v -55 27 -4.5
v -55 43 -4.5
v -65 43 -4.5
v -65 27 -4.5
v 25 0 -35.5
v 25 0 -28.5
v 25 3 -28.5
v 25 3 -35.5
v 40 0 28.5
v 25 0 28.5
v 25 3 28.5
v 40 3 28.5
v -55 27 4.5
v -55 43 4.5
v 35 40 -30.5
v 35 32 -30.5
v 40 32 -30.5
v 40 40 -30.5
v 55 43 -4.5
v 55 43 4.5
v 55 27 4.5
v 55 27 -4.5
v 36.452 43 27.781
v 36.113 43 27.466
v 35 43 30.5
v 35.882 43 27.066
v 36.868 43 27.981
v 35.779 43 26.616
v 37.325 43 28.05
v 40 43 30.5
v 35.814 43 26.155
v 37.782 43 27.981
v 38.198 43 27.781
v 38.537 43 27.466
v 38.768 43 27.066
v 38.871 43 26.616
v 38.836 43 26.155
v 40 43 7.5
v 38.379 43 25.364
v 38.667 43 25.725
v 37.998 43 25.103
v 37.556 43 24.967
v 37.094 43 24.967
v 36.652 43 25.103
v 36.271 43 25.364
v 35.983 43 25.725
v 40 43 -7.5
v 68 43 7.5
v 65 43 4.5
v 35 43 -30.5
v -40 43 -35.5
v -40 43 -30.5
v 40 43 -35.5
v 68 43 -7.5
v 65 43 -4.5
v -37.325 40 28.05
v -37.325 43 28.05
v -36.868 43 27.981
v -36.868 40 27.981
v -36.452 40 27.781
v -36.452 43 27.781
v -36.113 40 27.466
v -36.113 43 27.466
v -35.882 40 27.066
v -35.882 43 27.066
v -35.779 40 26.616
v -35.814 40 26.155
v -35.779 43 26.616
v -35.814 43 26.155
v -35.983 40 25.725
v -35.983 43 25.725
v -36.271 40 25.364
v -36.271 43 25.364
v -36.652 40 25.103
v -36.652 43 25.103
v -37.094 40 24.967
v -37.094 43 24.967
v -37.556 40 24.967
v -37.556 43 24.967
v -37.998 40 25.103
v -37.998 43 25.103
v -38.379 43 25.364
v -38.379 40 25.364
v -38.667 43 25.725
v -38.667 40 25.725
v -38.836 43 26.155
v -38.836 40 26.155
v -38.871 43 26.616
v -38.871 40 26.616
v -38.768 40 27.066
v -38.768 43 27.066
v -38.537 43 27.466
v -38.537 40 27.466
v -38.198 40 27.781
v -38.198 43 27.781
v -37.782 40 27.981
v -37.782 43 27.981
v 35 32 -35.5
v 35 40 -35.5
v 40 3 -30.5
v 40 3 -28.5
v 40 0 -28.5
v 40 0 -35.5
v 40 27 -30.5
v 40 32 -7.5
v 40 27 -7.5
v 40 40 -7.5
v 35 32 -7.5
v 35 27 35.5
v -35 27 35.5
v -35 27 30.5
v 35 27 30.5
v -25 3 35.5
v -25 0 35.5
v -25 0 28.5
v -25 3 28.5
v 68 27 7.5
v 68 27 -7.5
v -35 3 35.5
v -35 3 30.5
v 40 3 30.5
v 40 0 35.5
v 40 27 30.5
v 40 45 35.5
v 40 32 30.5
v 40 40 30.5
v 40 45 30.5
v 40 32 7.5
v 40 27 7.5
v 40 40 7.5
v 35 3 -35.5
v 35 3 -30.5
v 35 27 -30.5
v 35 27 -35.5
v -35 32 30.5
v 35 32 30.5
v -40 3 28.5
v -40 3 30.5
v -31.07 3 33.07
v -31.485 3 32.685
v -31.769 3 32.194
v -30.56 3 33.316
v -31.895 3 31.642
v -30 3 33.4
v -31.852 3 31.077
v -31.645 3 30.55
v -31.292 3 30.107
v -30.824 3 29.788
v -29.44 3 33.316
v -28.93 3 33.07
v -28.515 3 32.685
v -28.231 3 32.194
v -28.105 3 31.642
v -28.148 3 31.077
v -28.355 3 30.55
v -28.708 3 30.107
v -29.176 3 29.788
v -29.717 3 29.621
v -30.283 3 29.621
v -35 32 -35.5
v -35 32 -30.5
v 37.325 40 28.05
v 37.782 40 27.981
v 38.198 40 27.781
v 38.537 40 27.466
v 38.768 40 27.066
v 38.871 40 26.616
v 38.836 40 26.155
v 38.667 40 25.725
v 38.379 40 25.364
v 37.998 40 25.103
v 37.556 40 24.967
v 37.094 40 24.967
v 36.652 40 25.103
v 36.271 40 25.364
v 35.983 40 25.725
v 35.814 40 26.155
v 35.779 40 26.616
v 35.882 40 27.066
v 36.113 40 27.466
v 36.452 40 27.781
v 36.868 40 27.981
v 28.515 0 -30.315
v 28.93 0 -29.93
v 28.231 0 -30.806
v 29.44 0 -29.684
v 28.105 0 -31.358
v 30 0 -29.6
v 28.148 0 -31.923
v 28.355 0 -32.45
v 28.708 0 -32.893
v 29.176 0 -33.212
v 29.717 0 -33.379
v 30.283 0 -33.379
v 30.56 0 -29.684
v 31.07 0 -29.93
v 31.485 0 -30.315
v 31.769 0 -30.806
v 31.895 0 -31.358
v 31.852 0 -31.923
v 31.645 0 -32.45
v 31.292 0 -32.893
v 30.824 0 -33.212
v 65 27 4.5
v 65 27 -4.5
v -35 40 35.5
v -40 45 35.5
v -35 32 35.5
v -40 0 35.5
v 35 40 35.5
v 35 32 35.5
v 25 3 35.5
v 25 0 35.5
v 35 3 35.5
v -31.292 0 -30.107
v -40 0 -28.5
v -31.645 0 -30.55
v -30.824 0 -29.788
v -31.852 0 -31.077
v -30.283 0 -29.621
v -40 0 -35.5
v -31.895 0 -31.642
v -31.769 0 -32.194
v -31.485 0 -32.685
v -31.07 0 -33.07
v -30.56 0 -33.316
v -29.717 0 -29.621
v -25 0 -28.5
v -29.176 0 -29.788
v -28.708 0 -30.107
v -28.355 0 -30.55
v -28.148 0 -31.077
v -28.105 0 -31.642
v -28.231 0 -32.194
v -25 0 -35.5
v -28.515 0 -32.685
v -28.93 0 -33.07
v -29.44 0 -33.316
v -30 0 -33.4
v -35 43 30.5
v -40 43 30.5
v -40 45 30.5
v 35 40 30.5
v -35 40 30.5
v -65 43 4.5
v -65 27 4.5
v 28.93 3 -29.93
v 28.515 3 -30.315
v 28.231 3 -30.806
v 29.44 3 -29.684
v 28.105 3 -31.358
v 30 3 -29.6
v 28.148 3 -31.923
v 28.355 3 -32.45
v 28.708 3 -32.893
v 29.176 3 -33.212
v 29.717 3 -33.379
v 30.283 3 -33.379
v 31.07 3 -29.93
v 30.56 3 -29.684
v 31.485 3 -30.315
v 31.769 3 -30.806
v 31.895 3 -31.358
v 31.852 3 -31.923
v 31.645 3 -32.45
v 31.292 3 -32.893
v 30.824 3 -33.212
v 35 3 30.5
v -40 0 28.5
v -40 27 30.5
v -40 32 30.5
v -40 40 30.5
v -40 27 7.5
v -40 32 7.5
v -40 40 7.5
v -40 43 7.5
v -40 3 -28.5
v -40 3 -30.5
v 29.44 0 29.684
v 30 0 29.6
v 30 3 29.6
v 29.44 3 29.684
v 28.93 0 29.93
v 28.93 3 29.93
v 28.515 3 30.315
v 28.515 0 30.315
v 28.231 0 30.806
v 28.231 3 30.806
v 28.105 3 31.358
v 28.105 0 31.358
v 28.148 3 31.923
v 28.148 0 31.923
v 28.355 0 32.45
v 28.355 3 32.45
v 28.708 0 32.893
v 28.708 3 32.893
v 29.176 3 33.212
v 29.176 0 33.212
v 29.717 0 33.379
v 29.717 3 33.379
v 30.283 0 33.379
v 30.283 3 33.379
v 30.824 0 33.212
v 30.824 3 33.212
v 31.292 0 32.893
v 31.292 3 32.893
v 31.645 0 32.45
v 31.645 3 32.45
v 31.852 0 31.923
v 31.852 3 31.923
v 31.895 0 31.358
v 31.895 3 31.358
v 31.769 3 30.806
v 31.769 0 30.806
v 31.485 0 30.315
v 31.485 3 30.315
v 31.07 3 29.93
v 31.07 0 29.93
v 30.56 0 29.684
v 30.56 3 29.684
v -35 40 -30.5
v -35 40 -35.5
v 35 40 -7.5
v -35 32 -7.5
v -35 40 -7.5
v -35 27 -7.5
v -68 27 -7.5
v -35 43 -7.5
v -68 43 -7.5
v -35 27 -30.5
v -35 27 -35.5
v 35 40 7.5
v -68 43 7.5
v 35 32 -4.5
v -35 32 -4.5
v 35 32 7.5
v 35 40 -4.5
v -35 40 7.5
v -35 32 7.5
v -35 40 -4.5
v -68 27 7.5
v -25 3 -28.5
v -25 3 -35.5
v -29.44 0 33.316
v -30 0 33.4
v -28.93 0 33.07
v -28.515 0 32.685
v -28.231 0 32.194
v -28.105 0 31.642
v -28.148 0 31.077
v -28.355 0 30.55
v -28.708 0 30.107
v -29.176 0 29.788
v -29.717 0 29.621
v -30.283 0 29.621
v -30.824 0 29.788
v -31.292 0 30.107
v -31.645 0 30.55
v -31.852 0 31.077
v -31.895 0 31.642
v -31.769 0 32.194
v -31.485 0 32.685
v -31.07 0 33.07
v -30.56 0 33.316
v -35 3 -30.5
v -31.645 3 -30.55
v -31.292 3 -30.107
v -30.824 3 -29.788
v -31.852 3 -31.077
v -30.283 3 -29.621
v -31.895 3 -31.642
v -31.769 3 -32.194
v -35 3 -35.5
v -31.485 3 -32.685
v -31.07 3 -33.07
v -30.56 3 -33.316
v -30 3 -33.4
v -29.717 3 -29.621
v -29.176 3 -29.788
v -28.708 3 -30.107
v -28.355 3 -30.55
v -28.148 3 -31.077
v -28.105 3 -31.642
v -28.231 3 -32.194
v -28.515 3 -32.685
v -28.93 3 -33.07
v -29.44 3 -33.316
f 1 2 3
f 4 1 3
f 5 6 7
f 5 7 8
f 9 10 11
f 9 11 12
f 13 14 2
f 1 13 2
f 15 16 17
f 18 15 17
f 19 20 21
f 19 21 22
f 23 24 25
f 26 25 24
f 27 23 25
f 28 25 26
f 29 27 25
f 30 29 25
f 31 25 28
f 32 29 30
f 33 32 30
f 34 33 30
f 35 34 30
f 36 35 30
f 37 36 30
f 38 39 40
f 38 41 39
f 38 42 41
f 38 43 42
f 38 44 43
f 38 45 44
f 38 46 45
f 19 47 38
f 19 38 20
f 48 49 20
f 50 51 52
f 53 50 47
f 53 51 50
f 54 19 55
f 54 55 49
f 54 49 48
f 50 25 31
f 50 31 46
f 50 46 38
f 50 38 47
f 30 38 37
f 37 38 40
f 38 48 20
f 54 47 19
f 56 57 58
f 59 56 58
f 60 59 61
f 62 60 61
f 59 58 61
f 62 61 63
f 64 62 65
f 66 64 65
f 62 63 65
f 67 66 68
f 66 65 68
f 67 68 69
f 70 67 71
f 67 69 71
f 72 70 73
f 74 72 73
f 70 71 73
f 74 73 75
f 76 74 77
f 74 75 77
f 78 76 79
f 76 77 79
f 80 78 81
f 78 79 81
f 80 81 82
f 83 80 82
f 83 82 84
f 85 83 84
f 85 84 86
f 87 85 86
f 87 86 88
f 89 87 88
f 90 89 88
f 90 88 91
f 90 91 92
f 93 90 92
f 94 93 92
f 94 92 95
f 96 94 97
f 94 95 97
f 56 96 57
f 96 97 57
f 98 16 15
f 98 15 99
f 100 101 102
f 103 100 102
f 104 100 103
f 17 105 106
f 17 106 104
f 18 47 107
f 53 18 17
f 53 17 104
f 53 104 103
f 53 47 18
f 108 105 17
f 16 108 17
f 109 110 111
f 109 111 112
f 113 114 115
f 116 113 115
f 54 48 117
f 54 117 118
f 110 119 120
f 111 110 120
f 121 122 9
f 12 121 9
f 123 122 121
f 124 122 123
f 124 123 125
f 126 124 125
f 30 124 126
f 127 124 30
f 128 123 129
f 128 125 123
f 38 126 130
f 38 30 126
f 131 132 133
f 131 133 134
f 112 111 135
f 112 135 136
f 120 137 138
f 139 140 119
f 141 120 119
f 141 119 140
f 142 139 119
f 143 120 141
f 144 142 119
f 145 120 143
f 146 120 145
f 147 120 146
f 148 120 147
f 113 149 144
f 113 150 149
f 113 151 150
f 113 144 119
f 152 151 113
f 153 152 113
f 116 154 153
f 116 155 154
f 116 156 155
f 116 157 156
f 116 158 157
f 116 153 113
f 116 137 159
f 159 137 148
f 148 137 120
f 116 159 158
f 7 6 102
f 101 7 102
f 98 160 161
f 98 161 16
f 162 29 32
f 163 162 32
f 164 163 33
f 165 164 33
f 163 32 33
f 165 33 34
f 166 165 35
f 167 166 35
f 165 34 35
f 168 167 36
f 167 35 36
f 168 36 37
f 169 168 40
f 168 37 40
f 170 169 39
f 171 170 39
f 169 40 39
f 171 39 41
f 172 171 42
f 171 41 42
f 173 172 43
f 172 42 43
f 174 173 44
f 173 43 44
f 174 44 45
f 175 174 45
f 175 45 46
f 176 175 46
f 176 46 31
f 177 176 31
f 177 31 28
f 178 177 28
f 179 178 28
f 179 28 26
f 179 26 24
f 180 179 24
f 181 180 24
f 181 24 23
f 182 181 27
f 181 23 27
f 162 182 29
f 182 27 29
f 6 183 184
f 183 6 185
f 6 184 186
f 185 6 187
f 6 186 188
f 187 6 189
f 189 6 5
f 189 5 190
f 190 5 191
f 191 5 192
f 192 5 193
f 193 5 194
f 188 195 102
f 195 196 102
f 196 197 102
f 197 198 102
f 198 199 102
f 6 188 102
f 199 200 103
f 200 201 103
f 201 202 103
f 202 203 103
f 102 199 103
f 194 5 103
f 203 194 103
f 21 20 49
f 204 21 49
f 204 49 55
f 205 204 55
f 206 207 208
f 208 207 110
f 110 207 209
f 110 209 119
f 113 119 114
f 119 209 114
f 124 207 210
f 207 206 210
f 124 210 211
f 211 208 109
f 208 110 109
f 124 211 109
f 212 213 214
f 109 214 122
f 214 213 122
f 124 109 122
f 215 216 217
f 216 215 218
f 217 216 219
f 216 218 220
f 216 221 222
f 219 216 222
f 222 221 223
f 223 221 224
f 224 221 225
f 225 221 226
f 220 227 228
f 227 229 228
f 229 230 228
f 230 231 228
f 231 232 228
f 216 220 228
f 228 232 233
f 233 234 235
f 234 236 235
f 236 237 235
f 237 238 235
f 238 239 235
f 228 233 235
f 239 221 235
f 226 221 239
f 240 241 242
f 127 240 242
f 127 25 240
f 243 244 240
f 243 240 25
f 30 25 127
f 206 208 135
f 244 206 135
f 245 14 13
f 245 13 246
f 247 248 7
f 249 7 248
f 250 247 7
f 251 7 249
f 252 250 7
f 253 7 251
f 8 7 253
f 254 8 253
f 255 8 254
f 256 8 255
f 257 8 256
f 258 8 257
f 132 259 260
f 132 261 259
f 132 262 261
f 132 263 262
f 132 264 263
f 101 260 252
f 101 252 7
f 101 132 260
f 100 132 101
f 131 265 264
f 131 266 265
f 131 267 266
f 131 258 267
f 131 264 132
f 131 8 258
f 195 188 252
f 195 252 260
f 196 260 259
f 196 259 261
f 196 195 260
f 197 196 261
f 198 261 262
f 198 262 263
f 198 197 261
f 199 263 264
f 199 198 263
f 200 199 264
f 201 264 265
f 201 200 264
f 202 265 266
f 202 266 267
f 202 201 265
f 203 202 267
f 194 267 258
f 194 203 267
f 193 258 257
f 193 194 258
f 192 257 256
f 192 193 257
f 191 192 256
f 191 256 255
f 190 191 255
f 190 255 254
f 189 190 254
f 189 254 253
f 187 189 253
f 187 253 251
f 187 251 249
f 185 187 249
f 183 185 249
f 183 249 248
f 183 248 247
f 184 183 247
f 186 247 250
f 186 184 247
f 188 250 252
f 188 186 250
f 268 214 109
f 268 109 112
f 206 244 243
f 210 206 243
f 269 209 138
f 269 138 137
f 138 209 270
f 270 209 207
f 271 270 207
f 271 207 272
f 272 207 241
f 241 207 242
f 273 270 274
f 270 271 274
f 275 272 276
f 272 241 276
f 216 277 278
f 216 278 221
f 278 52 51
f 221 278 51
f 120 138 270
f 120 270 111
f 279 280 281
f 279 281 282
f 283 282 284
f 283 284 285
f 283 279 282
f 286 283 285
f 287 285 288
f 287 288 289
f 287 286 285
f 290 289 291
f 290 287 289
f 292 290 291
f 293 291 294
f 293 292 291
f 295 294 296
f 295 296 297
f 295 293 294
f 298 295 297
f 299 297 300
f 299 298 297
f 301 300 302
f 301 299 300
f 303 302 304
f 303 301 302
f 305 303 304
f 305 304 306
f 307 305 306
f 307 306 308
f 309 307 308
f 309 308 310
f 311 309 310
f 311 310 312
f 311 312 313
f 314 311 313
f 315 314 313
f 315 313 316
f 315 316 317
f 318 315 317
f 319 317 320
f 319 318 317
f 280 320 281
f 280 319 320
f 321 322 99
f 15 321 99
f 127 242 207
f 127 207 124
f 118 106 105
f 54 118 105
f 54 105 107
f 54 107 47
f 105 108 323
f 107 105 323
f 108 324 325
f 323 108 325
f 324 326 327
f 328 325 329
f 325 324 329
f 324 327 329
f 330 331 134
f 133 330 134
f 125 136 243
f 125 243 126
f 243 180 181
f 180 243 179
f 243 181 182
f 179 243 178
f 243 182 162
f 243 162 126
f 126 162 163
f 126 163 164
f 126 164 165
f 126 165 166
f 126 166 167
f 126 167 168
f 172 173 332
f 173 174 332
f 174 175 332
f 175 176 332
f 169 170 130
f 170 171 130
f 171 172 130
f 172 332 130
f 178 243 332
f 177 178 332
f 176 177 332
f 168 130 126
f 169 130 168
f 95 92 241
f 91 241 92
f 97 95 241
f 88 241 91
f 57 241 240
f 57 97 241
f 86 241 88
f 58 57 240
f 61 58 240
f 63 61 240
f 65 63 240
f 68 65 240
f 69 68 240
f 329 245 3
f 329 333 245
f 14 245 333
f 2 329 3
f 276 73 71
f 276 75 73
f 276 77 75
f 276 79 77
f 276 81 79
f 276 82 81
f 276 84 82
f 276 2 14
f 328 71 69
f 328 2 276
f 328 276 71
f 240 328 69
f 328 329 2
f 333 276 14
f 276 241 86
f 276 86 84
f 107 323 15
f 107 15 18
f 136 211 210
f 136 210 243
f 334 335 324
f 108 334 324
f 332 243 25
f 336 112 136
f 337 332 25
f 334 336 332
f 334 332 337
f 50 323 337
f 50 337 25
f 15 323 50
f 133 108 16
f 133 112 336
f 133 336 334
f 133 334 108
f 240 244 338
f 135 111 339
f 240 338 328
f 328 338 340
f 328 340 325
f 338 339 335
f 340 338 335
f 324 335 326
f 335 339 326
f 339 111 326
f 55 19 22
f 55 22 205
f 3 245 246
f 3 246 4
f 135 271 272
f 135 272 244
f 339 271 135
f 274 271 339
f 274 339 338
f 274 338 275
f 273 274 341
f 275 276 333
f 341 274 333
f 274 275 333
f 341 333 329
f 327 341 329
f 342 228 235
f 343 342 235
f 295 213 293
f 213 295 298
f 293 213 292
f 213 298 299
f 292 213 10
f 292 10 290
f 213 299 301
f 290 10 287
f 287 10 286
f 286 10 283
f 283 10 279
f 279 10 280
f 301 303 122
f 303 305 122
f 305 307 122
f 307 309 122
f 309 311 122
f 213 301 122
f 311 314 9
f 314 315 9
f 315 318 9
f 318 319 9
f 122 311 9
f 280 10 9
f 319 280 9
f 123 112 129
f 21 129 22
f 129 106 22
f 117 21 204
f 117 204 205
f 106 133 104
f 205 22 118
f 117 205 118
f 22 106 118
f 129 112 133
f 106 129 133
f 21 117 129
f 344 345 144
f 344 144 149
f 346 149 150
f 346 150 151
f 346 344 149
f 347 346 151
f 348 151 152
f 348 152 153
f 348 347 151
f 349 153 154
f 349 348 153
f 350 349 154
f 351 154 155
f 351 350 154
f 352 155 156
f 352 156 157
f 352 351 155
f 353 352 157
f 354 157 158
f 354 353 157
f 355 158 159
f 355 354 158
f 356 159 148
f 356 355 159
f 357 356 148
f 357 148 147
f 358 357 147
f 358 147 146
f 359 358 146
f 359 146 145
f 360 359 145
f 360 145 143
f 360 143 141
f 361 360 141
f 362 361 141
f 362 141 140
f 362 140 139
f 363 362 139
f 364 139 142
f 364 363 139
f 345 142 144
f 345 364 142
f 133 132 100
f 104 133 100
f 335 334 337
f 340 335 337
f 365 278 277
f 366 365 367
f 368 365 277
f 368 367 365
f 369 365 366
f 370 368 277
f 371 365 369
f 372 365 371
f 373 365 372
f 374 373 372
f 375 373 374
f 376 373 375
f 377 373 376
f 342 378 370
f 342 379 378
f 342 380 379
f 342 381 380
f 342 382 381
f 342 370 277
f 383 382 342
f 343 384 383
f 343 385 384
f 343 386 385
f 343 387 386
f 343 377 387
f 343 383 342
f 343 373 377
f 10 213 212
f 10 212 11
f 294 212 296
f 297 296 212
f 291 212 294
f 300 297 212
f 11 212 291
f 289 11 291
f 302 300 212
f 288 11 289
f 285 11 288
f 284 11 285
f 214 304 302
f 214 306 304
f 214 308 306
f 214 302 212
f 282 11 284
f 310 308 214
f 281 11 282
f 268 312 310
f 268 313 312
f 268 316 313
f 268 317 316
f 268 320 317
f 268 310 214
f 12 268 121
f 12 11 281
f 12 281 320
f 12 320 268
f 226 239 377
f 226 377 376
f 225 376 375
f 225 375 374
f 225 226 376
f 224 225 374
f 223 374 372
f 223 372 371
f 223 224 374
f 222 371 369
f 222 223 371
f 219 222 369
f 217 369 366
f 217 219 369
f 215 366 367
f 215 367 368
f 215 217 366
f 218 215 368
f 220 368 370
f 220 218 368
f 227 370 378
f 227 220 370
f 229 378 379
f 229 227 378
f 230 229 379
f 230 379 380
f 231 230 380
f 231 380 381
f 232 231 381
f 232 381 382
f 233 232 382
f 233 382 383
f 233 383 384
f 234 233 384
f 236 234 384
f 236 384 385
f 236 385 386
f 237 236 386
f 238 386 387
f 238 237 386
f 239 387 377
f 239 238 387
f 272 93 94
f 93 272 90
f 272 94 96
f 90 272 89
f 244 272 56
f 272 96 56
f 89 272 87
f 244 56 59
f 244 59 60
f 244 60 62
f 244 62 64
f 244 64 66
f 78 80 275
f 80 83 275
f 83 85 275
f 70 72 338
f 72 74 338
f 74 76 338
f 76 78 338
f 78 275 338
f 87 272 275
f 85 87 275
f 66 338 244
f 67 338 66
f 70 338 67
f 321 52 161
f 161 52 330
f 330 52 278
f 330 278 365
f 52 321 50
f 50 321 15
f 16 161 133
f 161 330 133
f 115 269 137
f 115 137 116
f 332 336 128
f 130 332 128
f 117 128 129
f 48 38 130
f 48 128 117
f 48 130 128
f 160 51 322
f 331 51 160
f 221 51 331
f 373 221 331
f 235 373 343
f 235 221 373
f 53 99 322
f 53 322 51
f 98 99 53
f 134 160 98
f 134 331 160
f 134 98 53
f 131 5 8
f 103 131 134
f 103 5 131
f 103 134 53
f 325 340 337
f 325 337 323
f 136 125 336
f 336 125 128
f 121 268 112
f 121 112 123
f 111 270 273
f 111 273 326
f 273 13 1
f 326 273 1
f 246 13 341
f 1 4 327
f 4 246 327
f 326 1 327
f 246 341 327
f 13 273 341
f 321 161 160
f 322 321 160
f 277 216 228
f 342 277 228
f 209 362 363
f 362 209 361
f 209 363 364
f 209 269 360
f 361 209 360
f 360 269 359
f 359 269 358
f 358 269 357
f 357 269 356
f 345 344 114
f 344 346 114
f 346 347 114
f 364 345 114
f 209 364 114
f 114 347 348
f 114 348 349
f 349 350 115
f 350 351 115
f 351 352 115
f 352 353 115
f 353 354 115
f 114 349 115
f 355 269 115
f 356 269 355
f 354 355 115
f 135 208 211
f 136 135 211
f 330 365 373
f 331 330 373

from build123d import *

# Parameters (mm, degrees)
SKETCH1_W             = 15
SKETCH1_H             = 7
SKETCH1_R             = 1.9
BOSS_EXTRUDE1_DEPTH   = 3
BOSS_EXTRUDE1_2_DEPTH = 3
BOSS_EXTRUDE1_3_DEPTH = 3
BOSS_EXTRUDE1_4_DEPTH = 3
SKETCH2_W             = 5
SKETCH2_H             = 5
BOSS_EXTRUDE2_DEPTH   = 37
SKETCH4_W             = 5
SKETCH4_H             = 61
BOSS_EXTRUDE3_DEPTH   = 3
BOSS_EXTRUDE3_2_DEPTH = 3
SKETCH5_W             = 80
SKETCH5_H             = 5
BOSS_EXTRUDE5_DEPTH   = 3
SKETCH6_W             = 80
SKETCH6_H             = 5
BOSS_EXTRUDE6_DEPTH   = 5
SKETCH7_R             = 1.55
CUT_EXTRUDE1_DEPTH    = 3
SKETCH8_W             = 70
SKETCH8_H             = 5
BOSS_EXTRUDE7_DEPTH   = 5
SKETCH9_W             = 61
SKETCH9_H             = 5
BOSS_EXTRUDE8_DEPTH   = 5
SKETCH13_W            = 33
SKETCH13_H            = 15
SKETCH13_W_2          = 10
SKETCH13_H_2          = 9
BOSS_EXTRUDE10_DEPTH  = 16
SKETCH14_W            = 3
SKETCH14_H            = 8
BOSS_EXTRUDE11_DEPTH  = 70
SKETCH15_W            = 5
SKETCH15_H            = 23
CUT_EXTRUDE4_DEPTH    = 16


with BuildPart() as part:
    # Sketch1 → Boss-Extrude1 (new body)
    with BuildSketch(Plane(origin=(0, 0, 0), x_dir=(1, 0, 0), z_dir=(0, 1, 0))):
        with Locations((32.5, 32)):
            Rectangle(SKETCH1_W, SKETCH1_H)
        with Locations(Location((30, 31.5, 0), (0, 0, 270))):
            Circle(SKETCH1_R, mode=Mode.SUBTRACT)
    extrude(amount=BOSS_EXTRUDE1_DEPTH)



with BuildPart() as body_2:
    # Sketch1 → Boss-Extrude1 2 (new body)
    with BuildSketch(Plane(origin=(0, 0, 0), x_dir=(1, 0, 0), z_dir=(0, 1, 0))):
        with Locations((32.5, -32)):
            Rectangle(SKETCH1_W, SKETCH1_H)
        with Locations(Location((30, -31.5, 0), (0, 0, 90))):
            Circle(SKETCH1_R, mode=Mode.SUBTRACT)
    extrude(amount=BOSS_EXTRUDE1_2_DEPTH)


with BuildPart() as body_3:
    # Sketch1 → Boss-Extrude1 3 (new body)
    with BuildSketch(Plane(origin=(0, 0, 0), x_dir=(1, 0, 0), z_dir=(0, 1, 0))):
        with Locations((-32.5, -32)):
            Rectangle(SKETCH1_W, SKETCH1_H)
        with Locations(Location((-30, -31.5, 0), (0, 0, 270))):
            Circle(SKETCH1_R, mode=Mode.SUBTRACT)
    extrude(amount=BOSS_EXTRUDE1_3_DEPTH)


with BuildPart() as body_4:
    # Sketch1 → Boss-Extrude1 4 (new body)
    with BuildSketch(Plane(origin=(0, 0, 0), x_dir=(1, 0, 0), z_dir=(0, 1, 0))):
        with Locations((-32.5, 32)):
            Rectangle(SKETCH1_W, SKETCH1_H)
        with Locations(Location((-30, 31.5, 0), (0, 0, 90))):
            Circle(SKETCH1_R, mode=Mode.SUBTRACT)
    extrude(amount=BOSS_EXTRUDE1_4_DEPTH)


with BuildPart() as part_1:
    add(part.part)

    add(body_2.part)  # Boss-Extrude2 merges body 2

    add(body_3.part)  # Boss-Extrude2 merges body 3

    add(body_4.part)  # Boss-Extrude2 merges body 4
    # Sketch2 → Boss-Extrude2 (add)
    with BuildSketch(Plane(origin=(0, 3, 0), x_dir=(1, 0, 0), z_dir=(0, 1, 0))):
        with Locations((37.5, 33)):
            Rectangle(SKETCH2_W, SKETCH2_H)
        with Locations((37.5, -33)):
            Rectangle(SKETCH2_W, SKETCH2_H)
        with Locations((-37.5, -33)):
            Rectangle(SKETCH2_W, SKETCH2_H)
        with Locations((-37.5, 33)):
            Rectangle(SKETCH2_W, SKETCH2_H)
    extrude(amount=BOSS_EXTRUDE2_DEPTH)



with BuildPart() as body_2_2:
    # Sketch4 → Boss-Extrude3 (new body)
    with BuildSketch(Plane(origin=(0, 40, 0), x_dir=(1, 0, 0), z_dir=(0, 1, 0))):
        with Locations((37.5, 0)):
            Rectangle(SKETCH4_W, SKETCH4_H)
    extrude(amount=BOSS_EXTRUDE3_DEPTH)


with BuildPart() as body_3_2:
    # Sketch4 → Boss-Extrude3 2 (new body)
    with BuildSketch(Plane(origin=(0, 40, 0), x_dir=(1, 0, 0), z_dir=(0, 1, 0))):
        with Locations((-37.5, 0)):
            Rectangle(SKETCH4_W, SKETCH4_H)
    extrude(amount=BOSS_EXTRUDE3_2_DEPTH)


with BuildPart() as part_2:
    add(part_1.part)

    add(body_2_2.part)  # Boss-Extrude5 merges body 2 2

    add(body_3_2.part)  # Boss-Extrude5 merges body 3 2
    # Sketch5 → Boss-Extrude5 (add)
    with BuildSketch(Plane(origin=(0, 40, 0), x_dir=(1, 0, 0), z_dir=(0, 1, 0))):
        with Locations((0, 33)):
            Rectangle(SKETCH5_W, SKETCH5_H)
    extrude(amount=BOSS_EXTRUDE5_DEPTH)

    # Sketch6 → Boss-Extrude6 (add)
    with BuildSketch(Plane(origin=(0, 40, 0), x_dir=(1, 0, 0), z_dir=(0, 1, 0))):
        with Locations((0, -33)):
            Rectangle(SKETCH6_W, SKETCH6_H)
    extrude(amount=BOSS_EXTRUDE6_DEPTH)

    # Sketch7 → Cut-Extrude1 (cut)
    with BuildSketch(Plane(origin=(0, 43, 0), x_dir=(1, 0, 0), z_dir=(0, 1, 0))):
        with Locations(Location((-37.325, -26.5, 0), (0, 0, 270))):
            Circle(SKETCH7_R)
        with Locations(Location((37.325, -26.5, 0), (0, 0, 270))):
            Circle(SKETCH7_R)
    extrude(amount=-CUT_EXTRUDE1_DEPTH, mode=Mode.SUBTRACT)

    # Sketch8 → Boss-Extrude7 (add)
    with BuildSketch(Plane.XY.offset(35.5)):
        with Locations((0, 29.5)):
            Rectangle(SKETCH8_W, SKETCH8_H)
    boss_extrude7 = extrude(amount=-BOSS_EXTRUDE7_DEPTH)

    # Mirror1: Boss-Extrude7 across plane
    add(boss_extrude7.mirror(Plane.XY))

    # Sketch9 → Boss-Extrude8 (add)
    with BuildSketch(Plane(origin=(40, 0, 0), x_dir=(0, 0, -1), z_dir=(1, 0, 0))):
        with Locations((0, 29.5)):
            Rectangle(SKETCH9_W, SKETCH9_H)
    boss_extrude8 = extrude(amount=-BOSS_EXTRUDE8_DEPTH)

    # Mirror2: Boss-Extrude8 across plane
    add(boss_extrude8.mirror(Plane(origin=(0, 0, 0), x_dir=(0, 0, 1), z_dir=(1, 0, 0))))

    # Sketch13 → Boss-Extrude10 (add)
    with BuildSketch(Plane(origin=(0, 43, 0), x_dir=(1, 0, 0), z_dir=(0, 1, 0))):
        with Locations((51.5, 0)):
            Rectangle(SKETCH13_W, SKETCH13_H)
        with Locations((60, 0)):
            Rectangle(SKETCH13_W_2, SKETCH13_H_2, mode=Mode.SUBTRACT)
    boss_extrude10 = extrude(amount=-BOSS_EXTRUDE10_DEPTH)

    # Mirror3: Boss-Extrude10 across plane
    add(boss_extrude10.mirror(Plane(origin=(0, 0, 0), x_dir=(0, 0, 1), z_dir=(1, 0, 0))))

    # Sketch14 → Boss-Extrude11 (add)
    with BuildSketch(Plane(origin=(-35, 0, 0), x_dir=(0, 0, -1), z_dir=(1, 0, 0))):
        with Locations((6, 36)):
            Rectangle(SKETCH14_W, SKETCH14_H)
    extrude(amount=BOSS_EXTRUDE11_DEPTH)

    # Sketch15 → Cut-Extrude4 (cut)
    with BuildSketch(Plane(origin=(0, 43, 0), x_dir=(1, 0, 0), z_dir=(0, 1, 0))):
        with Locations((-37.5, 19)):
            Rectangle(SKETCH15_W, SKETCH15_H)
    extrude(amount=-CUT_EXTRUDE4_DEPTH, mode=Mode.SUBTRACT)


solid = part_2.part
